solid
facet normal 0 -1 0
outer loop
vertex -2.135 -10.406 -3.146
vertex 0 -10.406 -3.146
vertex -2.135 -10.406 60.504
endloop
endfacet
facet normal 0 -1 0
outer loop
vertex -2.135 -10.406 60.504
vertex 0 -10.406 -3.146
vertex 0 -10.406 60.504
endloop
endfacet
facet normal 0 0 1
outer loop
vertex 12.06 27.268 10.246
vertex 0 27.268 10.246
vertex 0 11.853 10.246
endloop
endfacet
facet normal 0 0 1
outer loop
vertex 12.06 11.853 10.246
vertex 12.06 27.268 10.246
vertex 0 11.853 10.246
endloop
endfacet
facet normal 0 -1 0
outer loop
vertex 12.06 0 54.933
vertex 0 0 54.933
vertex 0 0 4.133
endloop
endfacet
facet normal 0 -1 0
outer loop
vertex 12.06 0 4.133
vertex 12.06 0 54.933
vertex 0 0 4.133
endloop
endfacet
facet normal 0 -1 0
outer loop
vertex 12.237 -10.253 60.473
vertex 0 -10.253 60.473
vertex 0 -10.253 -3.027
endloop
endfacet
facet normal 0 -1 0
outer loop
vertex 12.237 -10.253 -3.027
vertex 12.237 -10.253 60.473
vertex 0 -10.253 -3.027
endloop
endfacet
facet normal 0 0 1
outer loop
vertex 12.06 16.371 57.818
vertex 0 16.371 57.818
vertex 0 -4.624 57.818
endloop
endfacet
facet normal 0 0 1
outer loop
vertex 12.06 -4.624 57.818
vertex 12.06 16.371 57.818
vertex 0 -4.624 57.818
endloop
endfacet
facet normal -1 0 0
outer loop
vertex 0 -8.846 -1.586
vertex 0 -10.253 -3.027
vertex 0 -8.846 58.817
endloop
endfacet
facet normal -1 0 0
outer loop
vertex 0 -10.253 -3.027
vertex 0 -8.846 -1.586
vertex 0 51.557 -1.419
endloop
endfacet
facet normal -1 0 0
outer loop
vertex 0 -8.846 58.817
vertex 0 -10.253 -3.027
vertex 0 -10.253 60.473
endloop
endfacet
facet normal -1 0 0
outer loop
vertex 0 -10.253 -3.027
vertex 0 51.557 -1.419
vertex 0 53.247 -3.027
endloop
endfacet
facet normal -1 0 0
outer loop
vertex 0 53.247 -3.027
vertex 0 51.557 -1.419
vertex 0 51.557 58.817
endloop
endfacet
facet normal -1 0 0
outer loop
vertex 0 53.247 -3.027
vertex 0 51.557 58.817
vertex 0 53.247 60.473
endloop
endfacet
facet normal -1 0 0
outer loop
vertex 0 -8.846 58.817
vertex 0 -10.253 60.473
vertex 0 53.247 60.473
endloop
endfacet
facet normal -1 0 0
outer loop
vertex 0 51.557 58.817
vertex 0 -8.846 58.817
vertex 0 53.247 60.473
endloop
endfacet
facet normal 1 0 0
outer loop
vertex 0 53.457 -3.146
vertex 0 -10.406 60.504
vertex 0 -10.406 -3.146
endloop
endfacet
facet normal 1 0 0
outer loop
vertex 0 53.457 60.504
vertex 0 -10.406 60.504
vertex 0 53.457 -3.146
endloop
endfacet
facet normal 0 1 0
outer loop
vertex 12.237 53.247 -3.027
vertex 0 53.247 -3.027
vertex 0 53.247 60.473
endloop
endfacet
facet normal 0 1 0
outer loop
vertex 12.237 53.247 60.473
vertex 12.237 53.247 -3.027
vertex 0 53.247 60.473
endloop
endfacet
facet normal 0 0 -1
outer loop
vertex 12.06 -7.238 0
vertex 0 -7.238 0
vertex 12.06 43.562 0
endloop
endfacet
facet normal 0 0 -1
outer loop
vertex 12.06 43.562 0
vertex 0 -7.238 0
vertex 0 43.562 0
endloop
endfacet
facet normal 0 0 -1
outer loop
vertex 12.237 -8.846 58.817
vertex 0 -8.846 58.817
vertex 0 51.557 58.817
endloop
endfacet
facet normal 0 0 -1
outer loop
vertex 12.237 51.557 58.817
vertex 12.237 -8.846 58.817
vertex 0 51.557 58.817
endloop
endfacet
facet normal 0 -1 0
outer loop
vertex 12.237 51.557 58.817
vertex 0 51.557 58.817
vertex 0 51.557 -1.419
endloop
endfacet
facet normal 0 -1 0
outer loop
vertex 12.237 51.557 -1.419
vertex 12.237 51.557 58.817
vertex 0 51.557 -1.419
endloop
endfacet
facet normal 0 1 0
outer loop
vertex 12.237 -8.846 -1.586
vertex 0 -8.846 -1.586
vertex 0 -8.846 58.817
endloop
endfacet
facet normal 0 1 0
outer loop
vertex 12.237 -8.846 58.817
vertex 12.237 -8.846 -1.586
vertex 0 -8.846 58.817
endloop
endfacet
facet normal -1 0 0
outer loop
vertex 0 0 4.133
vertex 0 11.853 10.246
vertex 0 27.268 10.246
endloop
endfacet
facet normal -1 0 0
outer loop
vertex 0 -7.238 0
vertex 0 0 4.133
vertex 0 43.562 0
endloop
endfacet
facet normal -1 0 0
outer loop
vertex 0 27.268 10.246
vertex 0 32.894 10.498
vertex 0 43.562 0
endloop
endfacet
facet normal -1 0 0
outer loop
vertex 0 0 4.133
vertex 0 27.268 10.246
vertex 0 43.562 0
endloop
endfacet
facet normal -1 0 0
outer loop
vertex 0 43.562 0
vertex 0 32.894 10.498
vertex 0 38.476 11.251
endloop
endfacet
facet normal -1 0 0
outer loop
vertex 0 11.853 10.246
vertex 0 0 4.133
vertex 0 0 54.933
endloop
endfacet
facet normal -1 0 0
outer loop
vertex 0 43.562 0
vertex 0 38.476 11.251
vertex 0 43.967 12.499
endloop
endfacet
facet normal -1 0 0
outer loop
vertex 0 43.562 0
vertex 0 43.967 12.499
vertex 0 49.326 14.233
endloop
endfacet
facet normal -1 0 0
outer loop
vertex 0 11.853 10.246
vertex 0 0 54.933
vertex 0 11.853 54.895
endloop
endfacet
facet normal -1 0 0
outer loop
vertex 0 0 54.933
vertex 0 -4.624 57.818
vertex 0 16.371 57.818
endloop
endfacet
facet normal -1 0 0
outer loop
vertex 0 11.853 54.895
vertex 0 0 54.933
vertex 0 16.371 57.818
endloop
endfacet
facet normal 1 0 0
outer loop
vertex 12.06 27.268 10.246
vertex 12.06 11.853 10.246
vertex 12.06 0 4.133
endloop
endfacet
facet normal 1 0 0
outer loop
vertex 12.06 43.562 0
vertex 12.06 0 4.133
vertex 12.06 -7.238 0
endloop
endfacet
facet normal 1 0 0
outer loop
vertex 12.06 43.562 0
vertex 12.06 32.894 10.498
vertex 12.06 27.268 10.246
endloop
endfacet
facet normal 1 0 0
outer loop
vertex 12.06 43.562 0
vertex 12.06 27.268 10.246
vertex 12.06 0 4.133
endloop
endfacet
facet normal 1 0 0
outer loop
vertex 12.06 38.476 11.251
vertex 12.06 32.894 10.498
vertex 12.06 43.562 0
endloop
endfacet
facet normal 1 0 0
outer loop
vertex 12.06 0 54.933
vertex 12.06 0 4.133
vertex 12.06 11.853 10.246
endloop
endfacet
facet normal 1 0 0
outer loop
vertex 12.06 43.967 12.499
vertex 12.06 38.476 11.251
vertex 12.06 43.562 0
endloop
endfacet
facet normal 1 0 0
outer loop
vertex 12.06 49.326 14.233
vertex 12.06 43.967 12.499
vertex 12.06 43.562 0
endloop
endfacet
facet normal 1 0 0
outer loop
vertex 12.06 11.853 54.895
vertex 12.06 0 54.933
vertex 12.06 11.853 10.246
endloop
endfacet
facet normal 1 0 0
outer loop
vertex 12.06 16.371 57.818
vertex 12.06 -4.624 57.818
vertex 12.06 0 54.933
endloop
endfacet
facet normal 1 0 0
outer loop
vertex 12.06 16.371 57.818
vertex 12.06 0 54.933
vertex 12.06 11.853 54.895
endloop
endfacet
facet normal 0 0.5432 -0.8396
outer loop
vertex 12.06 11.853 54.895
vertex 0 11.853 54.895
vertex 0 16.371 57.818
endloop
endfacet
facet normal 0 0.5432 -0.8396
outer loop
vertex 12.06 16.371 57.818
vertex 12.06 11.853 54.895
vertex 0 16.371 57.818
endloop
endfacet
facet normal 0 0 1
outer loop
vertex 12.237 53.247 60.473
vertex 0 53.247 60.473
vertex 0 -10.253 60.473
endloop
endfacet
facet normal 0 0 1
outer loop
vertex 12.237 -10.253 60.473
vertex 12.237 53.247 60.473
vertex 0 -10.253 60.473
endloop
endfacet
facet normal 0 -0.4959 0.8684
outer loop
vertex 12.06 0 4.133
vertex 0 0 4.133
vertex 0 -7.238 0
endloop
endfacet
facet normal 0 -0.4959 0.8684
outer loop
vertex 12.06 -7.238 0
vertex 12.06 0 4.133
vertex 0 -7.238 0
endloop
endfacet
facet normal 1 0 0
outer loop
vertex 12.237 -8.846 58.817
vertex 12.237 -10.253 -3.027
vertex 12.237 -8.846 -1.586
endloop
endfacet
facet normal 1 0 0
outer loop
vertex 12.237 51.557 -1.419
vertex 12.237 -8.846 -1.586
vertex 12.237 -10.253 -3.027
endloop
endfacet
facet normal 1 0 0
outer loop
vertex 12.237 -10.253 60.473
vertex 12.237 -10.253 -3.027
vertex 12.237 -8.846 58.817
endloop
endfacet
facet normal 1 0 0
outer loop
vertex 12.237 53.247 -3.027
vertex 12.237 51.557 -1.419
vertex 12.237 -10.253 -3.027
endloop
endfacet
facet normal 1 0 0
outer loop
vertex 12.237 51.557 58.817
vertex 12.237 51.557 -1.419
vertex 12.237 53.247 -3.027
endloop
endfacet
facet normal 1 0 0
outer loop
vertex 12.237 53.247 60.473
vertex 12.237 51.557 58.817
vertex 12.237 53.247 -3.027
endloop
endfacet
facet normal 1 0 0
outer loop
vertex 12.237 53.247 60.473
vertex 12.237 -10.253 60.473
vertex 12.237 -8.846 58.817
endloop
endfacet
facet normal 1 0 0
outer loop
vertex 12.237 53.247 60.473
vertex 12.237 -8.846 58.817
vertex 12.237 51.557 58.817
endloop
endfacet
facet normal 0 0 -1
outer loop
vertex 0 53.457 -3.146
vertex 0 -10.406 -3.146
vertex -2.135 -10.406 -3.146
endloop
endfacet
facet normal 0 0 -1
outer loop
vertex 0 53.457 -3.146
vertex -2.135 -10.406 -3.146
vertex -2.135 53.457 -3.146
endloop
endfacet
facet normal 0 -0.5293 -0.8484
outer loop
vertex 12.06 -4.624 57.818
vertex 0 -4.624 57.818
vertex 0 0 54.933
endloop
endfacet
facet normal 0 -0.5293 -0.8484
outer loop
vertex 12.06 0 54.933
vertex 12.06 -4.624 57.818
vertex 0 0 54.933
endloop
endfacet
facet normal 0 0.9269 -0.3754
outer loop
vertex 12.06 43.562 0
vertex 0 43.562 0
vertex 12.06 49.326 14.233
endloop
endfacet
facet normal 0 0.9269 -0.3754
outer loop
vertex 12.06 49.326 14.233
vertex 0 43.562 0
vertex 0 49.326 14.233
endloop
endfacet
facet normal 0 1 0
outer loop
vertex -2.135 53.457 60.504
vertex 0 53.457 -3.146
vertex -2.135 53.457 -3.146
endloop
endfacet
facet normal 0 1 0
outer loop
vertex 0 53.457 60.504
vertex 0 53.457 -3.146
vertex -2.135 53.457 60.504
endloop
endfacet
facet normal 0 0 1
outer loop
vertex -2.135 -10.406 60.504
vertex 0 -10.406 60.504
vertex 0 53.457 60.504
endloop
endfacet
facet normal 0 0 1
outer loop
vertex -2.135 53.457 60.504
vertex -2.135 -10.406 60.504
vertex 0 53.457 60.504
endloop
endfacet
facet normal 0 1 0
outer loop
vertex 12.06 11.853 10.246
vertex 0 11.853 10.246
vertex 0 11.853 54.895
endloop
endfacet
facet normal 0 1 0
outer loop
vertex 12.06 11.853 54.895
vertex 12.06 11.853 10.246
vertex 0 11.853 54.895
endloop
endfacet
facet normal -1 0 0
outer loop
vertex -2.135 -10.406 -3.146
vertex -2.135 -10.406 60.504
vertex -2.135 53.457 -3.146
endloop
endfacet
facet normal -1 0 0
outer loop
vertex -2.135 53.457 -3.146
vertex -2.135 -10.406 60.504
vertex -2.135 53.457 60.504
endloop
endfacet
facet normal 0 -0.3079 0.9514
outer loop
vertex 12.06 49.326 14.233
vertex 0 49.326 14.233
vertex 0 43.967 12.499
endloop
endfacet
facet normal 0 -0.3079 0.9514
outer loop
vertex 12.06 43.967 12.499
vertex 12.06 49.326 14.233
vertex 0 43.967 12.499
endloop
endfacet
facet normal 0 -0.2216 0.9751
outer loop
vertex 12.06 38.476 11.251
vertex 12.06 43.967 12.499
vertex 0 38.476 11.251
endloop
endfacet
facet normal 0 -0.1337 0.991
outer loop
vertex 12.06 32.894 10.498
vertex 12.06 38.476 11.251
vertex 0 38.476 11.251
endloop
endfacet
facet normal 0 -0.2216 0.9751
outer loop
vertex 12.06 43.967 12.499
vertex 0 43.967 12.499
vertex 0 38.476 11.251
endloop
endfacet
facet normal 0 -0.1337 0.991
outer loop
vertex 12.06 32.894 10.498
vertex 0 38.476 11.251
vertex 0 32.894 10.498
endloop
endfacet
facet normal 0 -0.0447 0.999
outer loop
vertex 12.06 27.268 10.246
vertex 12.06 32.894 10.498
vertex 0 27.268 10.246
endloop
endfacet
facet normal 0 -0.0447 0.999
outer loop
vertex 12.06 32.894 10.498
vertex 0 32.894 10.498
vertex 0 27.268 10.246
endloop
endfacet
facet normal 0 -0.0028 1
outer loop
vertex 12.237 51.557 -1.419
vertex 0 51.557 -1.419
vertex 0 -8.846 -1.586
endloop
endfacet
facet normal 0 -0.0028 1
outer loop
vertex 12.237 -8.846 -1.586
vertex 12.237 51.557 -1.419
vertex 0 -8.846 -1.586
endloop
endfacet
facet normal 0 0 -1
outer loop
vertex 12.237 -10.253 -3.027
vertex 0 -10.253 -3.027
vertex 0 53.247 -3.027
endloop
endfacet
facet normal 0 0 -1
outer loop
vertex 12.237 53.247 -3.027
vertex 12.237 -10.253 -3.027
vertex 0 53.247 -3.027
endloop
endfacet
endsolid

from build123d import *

# Parameters (mm, degrees)
F1_DEPTH = 12.05993
F3_DEPTH = 12.23708
F4_W     = 63.862873
F4_H     = 63.649995
F5_DEPTH = 2.13452


with BuildPart() as f1:
    # F0 (on Right) → F1 (new body)
    with BuildSketch(Plane.YZ):
        with BuildLine():
            Line((0, 4.133418), (-7.237988, 0))
            Line((-7.237988, 0), (43.562012, 0))
            Line((43.562012, 0), (49.326111, 14.232506))
            ThreePointArc((49.326111, 14.232506), (38.475508, 11.250652), (27.267575, 10.246024))
            Line((27.267575, 10.246024), (11.853177, 10.246024))
            Line((11.853177, 10.246024), (11.853177, 54.894626))
            Line((11.853177, 54.894626), (16.371191, 57.818048))
            Line((16.371191, 57.818048), (-4.624283, 57.818048))
            Line((-4.624283, 57.818048), (0, 54.933418))
            Line((0, 54.933418), (0, 4.133418))
        make_face()
    extrude(amount=F1_DEPTH)


with BuildPart() as f3:
    # F2 (on Right) → F3 (new body)
    with BuildSketch(Plane.YZ):
        Polygon((-8.845868, -1.585666), (-10.253409, -3.027244), (53.246591, -3.027244), (51.556941, -1.418806), align=None)
        Polygon((-10.253409, 60.472756), (-10.253409, -3.027244), (-8.845868, -1.585666), (-8.845868, 58.817144), align=None)
        Polygon((51.556941, -1.418806), (53.246591, -3.027244), (53.246591, 60.472756), (51.556941, 58.817144), align=None)
        Polygon((53.246591, 60.472756), (-10.253409, 60.472756), (-8.845868, 58.817144), (51.556941, 58.817144), align=None)
    extrude(amount=F3_DEPTH)


with BuildPart() as f5:
    # F4 (on Right) → F5 (new body)
    with BuildSketch(Plane.YZ):
        with Locations((21.525492, 28.678787)):
            Rectangle(F4_W, F4_H)
    extrude(amount=-F5_DEPTH)


solid = Compound([f1.part, f3.part, f5.part])
